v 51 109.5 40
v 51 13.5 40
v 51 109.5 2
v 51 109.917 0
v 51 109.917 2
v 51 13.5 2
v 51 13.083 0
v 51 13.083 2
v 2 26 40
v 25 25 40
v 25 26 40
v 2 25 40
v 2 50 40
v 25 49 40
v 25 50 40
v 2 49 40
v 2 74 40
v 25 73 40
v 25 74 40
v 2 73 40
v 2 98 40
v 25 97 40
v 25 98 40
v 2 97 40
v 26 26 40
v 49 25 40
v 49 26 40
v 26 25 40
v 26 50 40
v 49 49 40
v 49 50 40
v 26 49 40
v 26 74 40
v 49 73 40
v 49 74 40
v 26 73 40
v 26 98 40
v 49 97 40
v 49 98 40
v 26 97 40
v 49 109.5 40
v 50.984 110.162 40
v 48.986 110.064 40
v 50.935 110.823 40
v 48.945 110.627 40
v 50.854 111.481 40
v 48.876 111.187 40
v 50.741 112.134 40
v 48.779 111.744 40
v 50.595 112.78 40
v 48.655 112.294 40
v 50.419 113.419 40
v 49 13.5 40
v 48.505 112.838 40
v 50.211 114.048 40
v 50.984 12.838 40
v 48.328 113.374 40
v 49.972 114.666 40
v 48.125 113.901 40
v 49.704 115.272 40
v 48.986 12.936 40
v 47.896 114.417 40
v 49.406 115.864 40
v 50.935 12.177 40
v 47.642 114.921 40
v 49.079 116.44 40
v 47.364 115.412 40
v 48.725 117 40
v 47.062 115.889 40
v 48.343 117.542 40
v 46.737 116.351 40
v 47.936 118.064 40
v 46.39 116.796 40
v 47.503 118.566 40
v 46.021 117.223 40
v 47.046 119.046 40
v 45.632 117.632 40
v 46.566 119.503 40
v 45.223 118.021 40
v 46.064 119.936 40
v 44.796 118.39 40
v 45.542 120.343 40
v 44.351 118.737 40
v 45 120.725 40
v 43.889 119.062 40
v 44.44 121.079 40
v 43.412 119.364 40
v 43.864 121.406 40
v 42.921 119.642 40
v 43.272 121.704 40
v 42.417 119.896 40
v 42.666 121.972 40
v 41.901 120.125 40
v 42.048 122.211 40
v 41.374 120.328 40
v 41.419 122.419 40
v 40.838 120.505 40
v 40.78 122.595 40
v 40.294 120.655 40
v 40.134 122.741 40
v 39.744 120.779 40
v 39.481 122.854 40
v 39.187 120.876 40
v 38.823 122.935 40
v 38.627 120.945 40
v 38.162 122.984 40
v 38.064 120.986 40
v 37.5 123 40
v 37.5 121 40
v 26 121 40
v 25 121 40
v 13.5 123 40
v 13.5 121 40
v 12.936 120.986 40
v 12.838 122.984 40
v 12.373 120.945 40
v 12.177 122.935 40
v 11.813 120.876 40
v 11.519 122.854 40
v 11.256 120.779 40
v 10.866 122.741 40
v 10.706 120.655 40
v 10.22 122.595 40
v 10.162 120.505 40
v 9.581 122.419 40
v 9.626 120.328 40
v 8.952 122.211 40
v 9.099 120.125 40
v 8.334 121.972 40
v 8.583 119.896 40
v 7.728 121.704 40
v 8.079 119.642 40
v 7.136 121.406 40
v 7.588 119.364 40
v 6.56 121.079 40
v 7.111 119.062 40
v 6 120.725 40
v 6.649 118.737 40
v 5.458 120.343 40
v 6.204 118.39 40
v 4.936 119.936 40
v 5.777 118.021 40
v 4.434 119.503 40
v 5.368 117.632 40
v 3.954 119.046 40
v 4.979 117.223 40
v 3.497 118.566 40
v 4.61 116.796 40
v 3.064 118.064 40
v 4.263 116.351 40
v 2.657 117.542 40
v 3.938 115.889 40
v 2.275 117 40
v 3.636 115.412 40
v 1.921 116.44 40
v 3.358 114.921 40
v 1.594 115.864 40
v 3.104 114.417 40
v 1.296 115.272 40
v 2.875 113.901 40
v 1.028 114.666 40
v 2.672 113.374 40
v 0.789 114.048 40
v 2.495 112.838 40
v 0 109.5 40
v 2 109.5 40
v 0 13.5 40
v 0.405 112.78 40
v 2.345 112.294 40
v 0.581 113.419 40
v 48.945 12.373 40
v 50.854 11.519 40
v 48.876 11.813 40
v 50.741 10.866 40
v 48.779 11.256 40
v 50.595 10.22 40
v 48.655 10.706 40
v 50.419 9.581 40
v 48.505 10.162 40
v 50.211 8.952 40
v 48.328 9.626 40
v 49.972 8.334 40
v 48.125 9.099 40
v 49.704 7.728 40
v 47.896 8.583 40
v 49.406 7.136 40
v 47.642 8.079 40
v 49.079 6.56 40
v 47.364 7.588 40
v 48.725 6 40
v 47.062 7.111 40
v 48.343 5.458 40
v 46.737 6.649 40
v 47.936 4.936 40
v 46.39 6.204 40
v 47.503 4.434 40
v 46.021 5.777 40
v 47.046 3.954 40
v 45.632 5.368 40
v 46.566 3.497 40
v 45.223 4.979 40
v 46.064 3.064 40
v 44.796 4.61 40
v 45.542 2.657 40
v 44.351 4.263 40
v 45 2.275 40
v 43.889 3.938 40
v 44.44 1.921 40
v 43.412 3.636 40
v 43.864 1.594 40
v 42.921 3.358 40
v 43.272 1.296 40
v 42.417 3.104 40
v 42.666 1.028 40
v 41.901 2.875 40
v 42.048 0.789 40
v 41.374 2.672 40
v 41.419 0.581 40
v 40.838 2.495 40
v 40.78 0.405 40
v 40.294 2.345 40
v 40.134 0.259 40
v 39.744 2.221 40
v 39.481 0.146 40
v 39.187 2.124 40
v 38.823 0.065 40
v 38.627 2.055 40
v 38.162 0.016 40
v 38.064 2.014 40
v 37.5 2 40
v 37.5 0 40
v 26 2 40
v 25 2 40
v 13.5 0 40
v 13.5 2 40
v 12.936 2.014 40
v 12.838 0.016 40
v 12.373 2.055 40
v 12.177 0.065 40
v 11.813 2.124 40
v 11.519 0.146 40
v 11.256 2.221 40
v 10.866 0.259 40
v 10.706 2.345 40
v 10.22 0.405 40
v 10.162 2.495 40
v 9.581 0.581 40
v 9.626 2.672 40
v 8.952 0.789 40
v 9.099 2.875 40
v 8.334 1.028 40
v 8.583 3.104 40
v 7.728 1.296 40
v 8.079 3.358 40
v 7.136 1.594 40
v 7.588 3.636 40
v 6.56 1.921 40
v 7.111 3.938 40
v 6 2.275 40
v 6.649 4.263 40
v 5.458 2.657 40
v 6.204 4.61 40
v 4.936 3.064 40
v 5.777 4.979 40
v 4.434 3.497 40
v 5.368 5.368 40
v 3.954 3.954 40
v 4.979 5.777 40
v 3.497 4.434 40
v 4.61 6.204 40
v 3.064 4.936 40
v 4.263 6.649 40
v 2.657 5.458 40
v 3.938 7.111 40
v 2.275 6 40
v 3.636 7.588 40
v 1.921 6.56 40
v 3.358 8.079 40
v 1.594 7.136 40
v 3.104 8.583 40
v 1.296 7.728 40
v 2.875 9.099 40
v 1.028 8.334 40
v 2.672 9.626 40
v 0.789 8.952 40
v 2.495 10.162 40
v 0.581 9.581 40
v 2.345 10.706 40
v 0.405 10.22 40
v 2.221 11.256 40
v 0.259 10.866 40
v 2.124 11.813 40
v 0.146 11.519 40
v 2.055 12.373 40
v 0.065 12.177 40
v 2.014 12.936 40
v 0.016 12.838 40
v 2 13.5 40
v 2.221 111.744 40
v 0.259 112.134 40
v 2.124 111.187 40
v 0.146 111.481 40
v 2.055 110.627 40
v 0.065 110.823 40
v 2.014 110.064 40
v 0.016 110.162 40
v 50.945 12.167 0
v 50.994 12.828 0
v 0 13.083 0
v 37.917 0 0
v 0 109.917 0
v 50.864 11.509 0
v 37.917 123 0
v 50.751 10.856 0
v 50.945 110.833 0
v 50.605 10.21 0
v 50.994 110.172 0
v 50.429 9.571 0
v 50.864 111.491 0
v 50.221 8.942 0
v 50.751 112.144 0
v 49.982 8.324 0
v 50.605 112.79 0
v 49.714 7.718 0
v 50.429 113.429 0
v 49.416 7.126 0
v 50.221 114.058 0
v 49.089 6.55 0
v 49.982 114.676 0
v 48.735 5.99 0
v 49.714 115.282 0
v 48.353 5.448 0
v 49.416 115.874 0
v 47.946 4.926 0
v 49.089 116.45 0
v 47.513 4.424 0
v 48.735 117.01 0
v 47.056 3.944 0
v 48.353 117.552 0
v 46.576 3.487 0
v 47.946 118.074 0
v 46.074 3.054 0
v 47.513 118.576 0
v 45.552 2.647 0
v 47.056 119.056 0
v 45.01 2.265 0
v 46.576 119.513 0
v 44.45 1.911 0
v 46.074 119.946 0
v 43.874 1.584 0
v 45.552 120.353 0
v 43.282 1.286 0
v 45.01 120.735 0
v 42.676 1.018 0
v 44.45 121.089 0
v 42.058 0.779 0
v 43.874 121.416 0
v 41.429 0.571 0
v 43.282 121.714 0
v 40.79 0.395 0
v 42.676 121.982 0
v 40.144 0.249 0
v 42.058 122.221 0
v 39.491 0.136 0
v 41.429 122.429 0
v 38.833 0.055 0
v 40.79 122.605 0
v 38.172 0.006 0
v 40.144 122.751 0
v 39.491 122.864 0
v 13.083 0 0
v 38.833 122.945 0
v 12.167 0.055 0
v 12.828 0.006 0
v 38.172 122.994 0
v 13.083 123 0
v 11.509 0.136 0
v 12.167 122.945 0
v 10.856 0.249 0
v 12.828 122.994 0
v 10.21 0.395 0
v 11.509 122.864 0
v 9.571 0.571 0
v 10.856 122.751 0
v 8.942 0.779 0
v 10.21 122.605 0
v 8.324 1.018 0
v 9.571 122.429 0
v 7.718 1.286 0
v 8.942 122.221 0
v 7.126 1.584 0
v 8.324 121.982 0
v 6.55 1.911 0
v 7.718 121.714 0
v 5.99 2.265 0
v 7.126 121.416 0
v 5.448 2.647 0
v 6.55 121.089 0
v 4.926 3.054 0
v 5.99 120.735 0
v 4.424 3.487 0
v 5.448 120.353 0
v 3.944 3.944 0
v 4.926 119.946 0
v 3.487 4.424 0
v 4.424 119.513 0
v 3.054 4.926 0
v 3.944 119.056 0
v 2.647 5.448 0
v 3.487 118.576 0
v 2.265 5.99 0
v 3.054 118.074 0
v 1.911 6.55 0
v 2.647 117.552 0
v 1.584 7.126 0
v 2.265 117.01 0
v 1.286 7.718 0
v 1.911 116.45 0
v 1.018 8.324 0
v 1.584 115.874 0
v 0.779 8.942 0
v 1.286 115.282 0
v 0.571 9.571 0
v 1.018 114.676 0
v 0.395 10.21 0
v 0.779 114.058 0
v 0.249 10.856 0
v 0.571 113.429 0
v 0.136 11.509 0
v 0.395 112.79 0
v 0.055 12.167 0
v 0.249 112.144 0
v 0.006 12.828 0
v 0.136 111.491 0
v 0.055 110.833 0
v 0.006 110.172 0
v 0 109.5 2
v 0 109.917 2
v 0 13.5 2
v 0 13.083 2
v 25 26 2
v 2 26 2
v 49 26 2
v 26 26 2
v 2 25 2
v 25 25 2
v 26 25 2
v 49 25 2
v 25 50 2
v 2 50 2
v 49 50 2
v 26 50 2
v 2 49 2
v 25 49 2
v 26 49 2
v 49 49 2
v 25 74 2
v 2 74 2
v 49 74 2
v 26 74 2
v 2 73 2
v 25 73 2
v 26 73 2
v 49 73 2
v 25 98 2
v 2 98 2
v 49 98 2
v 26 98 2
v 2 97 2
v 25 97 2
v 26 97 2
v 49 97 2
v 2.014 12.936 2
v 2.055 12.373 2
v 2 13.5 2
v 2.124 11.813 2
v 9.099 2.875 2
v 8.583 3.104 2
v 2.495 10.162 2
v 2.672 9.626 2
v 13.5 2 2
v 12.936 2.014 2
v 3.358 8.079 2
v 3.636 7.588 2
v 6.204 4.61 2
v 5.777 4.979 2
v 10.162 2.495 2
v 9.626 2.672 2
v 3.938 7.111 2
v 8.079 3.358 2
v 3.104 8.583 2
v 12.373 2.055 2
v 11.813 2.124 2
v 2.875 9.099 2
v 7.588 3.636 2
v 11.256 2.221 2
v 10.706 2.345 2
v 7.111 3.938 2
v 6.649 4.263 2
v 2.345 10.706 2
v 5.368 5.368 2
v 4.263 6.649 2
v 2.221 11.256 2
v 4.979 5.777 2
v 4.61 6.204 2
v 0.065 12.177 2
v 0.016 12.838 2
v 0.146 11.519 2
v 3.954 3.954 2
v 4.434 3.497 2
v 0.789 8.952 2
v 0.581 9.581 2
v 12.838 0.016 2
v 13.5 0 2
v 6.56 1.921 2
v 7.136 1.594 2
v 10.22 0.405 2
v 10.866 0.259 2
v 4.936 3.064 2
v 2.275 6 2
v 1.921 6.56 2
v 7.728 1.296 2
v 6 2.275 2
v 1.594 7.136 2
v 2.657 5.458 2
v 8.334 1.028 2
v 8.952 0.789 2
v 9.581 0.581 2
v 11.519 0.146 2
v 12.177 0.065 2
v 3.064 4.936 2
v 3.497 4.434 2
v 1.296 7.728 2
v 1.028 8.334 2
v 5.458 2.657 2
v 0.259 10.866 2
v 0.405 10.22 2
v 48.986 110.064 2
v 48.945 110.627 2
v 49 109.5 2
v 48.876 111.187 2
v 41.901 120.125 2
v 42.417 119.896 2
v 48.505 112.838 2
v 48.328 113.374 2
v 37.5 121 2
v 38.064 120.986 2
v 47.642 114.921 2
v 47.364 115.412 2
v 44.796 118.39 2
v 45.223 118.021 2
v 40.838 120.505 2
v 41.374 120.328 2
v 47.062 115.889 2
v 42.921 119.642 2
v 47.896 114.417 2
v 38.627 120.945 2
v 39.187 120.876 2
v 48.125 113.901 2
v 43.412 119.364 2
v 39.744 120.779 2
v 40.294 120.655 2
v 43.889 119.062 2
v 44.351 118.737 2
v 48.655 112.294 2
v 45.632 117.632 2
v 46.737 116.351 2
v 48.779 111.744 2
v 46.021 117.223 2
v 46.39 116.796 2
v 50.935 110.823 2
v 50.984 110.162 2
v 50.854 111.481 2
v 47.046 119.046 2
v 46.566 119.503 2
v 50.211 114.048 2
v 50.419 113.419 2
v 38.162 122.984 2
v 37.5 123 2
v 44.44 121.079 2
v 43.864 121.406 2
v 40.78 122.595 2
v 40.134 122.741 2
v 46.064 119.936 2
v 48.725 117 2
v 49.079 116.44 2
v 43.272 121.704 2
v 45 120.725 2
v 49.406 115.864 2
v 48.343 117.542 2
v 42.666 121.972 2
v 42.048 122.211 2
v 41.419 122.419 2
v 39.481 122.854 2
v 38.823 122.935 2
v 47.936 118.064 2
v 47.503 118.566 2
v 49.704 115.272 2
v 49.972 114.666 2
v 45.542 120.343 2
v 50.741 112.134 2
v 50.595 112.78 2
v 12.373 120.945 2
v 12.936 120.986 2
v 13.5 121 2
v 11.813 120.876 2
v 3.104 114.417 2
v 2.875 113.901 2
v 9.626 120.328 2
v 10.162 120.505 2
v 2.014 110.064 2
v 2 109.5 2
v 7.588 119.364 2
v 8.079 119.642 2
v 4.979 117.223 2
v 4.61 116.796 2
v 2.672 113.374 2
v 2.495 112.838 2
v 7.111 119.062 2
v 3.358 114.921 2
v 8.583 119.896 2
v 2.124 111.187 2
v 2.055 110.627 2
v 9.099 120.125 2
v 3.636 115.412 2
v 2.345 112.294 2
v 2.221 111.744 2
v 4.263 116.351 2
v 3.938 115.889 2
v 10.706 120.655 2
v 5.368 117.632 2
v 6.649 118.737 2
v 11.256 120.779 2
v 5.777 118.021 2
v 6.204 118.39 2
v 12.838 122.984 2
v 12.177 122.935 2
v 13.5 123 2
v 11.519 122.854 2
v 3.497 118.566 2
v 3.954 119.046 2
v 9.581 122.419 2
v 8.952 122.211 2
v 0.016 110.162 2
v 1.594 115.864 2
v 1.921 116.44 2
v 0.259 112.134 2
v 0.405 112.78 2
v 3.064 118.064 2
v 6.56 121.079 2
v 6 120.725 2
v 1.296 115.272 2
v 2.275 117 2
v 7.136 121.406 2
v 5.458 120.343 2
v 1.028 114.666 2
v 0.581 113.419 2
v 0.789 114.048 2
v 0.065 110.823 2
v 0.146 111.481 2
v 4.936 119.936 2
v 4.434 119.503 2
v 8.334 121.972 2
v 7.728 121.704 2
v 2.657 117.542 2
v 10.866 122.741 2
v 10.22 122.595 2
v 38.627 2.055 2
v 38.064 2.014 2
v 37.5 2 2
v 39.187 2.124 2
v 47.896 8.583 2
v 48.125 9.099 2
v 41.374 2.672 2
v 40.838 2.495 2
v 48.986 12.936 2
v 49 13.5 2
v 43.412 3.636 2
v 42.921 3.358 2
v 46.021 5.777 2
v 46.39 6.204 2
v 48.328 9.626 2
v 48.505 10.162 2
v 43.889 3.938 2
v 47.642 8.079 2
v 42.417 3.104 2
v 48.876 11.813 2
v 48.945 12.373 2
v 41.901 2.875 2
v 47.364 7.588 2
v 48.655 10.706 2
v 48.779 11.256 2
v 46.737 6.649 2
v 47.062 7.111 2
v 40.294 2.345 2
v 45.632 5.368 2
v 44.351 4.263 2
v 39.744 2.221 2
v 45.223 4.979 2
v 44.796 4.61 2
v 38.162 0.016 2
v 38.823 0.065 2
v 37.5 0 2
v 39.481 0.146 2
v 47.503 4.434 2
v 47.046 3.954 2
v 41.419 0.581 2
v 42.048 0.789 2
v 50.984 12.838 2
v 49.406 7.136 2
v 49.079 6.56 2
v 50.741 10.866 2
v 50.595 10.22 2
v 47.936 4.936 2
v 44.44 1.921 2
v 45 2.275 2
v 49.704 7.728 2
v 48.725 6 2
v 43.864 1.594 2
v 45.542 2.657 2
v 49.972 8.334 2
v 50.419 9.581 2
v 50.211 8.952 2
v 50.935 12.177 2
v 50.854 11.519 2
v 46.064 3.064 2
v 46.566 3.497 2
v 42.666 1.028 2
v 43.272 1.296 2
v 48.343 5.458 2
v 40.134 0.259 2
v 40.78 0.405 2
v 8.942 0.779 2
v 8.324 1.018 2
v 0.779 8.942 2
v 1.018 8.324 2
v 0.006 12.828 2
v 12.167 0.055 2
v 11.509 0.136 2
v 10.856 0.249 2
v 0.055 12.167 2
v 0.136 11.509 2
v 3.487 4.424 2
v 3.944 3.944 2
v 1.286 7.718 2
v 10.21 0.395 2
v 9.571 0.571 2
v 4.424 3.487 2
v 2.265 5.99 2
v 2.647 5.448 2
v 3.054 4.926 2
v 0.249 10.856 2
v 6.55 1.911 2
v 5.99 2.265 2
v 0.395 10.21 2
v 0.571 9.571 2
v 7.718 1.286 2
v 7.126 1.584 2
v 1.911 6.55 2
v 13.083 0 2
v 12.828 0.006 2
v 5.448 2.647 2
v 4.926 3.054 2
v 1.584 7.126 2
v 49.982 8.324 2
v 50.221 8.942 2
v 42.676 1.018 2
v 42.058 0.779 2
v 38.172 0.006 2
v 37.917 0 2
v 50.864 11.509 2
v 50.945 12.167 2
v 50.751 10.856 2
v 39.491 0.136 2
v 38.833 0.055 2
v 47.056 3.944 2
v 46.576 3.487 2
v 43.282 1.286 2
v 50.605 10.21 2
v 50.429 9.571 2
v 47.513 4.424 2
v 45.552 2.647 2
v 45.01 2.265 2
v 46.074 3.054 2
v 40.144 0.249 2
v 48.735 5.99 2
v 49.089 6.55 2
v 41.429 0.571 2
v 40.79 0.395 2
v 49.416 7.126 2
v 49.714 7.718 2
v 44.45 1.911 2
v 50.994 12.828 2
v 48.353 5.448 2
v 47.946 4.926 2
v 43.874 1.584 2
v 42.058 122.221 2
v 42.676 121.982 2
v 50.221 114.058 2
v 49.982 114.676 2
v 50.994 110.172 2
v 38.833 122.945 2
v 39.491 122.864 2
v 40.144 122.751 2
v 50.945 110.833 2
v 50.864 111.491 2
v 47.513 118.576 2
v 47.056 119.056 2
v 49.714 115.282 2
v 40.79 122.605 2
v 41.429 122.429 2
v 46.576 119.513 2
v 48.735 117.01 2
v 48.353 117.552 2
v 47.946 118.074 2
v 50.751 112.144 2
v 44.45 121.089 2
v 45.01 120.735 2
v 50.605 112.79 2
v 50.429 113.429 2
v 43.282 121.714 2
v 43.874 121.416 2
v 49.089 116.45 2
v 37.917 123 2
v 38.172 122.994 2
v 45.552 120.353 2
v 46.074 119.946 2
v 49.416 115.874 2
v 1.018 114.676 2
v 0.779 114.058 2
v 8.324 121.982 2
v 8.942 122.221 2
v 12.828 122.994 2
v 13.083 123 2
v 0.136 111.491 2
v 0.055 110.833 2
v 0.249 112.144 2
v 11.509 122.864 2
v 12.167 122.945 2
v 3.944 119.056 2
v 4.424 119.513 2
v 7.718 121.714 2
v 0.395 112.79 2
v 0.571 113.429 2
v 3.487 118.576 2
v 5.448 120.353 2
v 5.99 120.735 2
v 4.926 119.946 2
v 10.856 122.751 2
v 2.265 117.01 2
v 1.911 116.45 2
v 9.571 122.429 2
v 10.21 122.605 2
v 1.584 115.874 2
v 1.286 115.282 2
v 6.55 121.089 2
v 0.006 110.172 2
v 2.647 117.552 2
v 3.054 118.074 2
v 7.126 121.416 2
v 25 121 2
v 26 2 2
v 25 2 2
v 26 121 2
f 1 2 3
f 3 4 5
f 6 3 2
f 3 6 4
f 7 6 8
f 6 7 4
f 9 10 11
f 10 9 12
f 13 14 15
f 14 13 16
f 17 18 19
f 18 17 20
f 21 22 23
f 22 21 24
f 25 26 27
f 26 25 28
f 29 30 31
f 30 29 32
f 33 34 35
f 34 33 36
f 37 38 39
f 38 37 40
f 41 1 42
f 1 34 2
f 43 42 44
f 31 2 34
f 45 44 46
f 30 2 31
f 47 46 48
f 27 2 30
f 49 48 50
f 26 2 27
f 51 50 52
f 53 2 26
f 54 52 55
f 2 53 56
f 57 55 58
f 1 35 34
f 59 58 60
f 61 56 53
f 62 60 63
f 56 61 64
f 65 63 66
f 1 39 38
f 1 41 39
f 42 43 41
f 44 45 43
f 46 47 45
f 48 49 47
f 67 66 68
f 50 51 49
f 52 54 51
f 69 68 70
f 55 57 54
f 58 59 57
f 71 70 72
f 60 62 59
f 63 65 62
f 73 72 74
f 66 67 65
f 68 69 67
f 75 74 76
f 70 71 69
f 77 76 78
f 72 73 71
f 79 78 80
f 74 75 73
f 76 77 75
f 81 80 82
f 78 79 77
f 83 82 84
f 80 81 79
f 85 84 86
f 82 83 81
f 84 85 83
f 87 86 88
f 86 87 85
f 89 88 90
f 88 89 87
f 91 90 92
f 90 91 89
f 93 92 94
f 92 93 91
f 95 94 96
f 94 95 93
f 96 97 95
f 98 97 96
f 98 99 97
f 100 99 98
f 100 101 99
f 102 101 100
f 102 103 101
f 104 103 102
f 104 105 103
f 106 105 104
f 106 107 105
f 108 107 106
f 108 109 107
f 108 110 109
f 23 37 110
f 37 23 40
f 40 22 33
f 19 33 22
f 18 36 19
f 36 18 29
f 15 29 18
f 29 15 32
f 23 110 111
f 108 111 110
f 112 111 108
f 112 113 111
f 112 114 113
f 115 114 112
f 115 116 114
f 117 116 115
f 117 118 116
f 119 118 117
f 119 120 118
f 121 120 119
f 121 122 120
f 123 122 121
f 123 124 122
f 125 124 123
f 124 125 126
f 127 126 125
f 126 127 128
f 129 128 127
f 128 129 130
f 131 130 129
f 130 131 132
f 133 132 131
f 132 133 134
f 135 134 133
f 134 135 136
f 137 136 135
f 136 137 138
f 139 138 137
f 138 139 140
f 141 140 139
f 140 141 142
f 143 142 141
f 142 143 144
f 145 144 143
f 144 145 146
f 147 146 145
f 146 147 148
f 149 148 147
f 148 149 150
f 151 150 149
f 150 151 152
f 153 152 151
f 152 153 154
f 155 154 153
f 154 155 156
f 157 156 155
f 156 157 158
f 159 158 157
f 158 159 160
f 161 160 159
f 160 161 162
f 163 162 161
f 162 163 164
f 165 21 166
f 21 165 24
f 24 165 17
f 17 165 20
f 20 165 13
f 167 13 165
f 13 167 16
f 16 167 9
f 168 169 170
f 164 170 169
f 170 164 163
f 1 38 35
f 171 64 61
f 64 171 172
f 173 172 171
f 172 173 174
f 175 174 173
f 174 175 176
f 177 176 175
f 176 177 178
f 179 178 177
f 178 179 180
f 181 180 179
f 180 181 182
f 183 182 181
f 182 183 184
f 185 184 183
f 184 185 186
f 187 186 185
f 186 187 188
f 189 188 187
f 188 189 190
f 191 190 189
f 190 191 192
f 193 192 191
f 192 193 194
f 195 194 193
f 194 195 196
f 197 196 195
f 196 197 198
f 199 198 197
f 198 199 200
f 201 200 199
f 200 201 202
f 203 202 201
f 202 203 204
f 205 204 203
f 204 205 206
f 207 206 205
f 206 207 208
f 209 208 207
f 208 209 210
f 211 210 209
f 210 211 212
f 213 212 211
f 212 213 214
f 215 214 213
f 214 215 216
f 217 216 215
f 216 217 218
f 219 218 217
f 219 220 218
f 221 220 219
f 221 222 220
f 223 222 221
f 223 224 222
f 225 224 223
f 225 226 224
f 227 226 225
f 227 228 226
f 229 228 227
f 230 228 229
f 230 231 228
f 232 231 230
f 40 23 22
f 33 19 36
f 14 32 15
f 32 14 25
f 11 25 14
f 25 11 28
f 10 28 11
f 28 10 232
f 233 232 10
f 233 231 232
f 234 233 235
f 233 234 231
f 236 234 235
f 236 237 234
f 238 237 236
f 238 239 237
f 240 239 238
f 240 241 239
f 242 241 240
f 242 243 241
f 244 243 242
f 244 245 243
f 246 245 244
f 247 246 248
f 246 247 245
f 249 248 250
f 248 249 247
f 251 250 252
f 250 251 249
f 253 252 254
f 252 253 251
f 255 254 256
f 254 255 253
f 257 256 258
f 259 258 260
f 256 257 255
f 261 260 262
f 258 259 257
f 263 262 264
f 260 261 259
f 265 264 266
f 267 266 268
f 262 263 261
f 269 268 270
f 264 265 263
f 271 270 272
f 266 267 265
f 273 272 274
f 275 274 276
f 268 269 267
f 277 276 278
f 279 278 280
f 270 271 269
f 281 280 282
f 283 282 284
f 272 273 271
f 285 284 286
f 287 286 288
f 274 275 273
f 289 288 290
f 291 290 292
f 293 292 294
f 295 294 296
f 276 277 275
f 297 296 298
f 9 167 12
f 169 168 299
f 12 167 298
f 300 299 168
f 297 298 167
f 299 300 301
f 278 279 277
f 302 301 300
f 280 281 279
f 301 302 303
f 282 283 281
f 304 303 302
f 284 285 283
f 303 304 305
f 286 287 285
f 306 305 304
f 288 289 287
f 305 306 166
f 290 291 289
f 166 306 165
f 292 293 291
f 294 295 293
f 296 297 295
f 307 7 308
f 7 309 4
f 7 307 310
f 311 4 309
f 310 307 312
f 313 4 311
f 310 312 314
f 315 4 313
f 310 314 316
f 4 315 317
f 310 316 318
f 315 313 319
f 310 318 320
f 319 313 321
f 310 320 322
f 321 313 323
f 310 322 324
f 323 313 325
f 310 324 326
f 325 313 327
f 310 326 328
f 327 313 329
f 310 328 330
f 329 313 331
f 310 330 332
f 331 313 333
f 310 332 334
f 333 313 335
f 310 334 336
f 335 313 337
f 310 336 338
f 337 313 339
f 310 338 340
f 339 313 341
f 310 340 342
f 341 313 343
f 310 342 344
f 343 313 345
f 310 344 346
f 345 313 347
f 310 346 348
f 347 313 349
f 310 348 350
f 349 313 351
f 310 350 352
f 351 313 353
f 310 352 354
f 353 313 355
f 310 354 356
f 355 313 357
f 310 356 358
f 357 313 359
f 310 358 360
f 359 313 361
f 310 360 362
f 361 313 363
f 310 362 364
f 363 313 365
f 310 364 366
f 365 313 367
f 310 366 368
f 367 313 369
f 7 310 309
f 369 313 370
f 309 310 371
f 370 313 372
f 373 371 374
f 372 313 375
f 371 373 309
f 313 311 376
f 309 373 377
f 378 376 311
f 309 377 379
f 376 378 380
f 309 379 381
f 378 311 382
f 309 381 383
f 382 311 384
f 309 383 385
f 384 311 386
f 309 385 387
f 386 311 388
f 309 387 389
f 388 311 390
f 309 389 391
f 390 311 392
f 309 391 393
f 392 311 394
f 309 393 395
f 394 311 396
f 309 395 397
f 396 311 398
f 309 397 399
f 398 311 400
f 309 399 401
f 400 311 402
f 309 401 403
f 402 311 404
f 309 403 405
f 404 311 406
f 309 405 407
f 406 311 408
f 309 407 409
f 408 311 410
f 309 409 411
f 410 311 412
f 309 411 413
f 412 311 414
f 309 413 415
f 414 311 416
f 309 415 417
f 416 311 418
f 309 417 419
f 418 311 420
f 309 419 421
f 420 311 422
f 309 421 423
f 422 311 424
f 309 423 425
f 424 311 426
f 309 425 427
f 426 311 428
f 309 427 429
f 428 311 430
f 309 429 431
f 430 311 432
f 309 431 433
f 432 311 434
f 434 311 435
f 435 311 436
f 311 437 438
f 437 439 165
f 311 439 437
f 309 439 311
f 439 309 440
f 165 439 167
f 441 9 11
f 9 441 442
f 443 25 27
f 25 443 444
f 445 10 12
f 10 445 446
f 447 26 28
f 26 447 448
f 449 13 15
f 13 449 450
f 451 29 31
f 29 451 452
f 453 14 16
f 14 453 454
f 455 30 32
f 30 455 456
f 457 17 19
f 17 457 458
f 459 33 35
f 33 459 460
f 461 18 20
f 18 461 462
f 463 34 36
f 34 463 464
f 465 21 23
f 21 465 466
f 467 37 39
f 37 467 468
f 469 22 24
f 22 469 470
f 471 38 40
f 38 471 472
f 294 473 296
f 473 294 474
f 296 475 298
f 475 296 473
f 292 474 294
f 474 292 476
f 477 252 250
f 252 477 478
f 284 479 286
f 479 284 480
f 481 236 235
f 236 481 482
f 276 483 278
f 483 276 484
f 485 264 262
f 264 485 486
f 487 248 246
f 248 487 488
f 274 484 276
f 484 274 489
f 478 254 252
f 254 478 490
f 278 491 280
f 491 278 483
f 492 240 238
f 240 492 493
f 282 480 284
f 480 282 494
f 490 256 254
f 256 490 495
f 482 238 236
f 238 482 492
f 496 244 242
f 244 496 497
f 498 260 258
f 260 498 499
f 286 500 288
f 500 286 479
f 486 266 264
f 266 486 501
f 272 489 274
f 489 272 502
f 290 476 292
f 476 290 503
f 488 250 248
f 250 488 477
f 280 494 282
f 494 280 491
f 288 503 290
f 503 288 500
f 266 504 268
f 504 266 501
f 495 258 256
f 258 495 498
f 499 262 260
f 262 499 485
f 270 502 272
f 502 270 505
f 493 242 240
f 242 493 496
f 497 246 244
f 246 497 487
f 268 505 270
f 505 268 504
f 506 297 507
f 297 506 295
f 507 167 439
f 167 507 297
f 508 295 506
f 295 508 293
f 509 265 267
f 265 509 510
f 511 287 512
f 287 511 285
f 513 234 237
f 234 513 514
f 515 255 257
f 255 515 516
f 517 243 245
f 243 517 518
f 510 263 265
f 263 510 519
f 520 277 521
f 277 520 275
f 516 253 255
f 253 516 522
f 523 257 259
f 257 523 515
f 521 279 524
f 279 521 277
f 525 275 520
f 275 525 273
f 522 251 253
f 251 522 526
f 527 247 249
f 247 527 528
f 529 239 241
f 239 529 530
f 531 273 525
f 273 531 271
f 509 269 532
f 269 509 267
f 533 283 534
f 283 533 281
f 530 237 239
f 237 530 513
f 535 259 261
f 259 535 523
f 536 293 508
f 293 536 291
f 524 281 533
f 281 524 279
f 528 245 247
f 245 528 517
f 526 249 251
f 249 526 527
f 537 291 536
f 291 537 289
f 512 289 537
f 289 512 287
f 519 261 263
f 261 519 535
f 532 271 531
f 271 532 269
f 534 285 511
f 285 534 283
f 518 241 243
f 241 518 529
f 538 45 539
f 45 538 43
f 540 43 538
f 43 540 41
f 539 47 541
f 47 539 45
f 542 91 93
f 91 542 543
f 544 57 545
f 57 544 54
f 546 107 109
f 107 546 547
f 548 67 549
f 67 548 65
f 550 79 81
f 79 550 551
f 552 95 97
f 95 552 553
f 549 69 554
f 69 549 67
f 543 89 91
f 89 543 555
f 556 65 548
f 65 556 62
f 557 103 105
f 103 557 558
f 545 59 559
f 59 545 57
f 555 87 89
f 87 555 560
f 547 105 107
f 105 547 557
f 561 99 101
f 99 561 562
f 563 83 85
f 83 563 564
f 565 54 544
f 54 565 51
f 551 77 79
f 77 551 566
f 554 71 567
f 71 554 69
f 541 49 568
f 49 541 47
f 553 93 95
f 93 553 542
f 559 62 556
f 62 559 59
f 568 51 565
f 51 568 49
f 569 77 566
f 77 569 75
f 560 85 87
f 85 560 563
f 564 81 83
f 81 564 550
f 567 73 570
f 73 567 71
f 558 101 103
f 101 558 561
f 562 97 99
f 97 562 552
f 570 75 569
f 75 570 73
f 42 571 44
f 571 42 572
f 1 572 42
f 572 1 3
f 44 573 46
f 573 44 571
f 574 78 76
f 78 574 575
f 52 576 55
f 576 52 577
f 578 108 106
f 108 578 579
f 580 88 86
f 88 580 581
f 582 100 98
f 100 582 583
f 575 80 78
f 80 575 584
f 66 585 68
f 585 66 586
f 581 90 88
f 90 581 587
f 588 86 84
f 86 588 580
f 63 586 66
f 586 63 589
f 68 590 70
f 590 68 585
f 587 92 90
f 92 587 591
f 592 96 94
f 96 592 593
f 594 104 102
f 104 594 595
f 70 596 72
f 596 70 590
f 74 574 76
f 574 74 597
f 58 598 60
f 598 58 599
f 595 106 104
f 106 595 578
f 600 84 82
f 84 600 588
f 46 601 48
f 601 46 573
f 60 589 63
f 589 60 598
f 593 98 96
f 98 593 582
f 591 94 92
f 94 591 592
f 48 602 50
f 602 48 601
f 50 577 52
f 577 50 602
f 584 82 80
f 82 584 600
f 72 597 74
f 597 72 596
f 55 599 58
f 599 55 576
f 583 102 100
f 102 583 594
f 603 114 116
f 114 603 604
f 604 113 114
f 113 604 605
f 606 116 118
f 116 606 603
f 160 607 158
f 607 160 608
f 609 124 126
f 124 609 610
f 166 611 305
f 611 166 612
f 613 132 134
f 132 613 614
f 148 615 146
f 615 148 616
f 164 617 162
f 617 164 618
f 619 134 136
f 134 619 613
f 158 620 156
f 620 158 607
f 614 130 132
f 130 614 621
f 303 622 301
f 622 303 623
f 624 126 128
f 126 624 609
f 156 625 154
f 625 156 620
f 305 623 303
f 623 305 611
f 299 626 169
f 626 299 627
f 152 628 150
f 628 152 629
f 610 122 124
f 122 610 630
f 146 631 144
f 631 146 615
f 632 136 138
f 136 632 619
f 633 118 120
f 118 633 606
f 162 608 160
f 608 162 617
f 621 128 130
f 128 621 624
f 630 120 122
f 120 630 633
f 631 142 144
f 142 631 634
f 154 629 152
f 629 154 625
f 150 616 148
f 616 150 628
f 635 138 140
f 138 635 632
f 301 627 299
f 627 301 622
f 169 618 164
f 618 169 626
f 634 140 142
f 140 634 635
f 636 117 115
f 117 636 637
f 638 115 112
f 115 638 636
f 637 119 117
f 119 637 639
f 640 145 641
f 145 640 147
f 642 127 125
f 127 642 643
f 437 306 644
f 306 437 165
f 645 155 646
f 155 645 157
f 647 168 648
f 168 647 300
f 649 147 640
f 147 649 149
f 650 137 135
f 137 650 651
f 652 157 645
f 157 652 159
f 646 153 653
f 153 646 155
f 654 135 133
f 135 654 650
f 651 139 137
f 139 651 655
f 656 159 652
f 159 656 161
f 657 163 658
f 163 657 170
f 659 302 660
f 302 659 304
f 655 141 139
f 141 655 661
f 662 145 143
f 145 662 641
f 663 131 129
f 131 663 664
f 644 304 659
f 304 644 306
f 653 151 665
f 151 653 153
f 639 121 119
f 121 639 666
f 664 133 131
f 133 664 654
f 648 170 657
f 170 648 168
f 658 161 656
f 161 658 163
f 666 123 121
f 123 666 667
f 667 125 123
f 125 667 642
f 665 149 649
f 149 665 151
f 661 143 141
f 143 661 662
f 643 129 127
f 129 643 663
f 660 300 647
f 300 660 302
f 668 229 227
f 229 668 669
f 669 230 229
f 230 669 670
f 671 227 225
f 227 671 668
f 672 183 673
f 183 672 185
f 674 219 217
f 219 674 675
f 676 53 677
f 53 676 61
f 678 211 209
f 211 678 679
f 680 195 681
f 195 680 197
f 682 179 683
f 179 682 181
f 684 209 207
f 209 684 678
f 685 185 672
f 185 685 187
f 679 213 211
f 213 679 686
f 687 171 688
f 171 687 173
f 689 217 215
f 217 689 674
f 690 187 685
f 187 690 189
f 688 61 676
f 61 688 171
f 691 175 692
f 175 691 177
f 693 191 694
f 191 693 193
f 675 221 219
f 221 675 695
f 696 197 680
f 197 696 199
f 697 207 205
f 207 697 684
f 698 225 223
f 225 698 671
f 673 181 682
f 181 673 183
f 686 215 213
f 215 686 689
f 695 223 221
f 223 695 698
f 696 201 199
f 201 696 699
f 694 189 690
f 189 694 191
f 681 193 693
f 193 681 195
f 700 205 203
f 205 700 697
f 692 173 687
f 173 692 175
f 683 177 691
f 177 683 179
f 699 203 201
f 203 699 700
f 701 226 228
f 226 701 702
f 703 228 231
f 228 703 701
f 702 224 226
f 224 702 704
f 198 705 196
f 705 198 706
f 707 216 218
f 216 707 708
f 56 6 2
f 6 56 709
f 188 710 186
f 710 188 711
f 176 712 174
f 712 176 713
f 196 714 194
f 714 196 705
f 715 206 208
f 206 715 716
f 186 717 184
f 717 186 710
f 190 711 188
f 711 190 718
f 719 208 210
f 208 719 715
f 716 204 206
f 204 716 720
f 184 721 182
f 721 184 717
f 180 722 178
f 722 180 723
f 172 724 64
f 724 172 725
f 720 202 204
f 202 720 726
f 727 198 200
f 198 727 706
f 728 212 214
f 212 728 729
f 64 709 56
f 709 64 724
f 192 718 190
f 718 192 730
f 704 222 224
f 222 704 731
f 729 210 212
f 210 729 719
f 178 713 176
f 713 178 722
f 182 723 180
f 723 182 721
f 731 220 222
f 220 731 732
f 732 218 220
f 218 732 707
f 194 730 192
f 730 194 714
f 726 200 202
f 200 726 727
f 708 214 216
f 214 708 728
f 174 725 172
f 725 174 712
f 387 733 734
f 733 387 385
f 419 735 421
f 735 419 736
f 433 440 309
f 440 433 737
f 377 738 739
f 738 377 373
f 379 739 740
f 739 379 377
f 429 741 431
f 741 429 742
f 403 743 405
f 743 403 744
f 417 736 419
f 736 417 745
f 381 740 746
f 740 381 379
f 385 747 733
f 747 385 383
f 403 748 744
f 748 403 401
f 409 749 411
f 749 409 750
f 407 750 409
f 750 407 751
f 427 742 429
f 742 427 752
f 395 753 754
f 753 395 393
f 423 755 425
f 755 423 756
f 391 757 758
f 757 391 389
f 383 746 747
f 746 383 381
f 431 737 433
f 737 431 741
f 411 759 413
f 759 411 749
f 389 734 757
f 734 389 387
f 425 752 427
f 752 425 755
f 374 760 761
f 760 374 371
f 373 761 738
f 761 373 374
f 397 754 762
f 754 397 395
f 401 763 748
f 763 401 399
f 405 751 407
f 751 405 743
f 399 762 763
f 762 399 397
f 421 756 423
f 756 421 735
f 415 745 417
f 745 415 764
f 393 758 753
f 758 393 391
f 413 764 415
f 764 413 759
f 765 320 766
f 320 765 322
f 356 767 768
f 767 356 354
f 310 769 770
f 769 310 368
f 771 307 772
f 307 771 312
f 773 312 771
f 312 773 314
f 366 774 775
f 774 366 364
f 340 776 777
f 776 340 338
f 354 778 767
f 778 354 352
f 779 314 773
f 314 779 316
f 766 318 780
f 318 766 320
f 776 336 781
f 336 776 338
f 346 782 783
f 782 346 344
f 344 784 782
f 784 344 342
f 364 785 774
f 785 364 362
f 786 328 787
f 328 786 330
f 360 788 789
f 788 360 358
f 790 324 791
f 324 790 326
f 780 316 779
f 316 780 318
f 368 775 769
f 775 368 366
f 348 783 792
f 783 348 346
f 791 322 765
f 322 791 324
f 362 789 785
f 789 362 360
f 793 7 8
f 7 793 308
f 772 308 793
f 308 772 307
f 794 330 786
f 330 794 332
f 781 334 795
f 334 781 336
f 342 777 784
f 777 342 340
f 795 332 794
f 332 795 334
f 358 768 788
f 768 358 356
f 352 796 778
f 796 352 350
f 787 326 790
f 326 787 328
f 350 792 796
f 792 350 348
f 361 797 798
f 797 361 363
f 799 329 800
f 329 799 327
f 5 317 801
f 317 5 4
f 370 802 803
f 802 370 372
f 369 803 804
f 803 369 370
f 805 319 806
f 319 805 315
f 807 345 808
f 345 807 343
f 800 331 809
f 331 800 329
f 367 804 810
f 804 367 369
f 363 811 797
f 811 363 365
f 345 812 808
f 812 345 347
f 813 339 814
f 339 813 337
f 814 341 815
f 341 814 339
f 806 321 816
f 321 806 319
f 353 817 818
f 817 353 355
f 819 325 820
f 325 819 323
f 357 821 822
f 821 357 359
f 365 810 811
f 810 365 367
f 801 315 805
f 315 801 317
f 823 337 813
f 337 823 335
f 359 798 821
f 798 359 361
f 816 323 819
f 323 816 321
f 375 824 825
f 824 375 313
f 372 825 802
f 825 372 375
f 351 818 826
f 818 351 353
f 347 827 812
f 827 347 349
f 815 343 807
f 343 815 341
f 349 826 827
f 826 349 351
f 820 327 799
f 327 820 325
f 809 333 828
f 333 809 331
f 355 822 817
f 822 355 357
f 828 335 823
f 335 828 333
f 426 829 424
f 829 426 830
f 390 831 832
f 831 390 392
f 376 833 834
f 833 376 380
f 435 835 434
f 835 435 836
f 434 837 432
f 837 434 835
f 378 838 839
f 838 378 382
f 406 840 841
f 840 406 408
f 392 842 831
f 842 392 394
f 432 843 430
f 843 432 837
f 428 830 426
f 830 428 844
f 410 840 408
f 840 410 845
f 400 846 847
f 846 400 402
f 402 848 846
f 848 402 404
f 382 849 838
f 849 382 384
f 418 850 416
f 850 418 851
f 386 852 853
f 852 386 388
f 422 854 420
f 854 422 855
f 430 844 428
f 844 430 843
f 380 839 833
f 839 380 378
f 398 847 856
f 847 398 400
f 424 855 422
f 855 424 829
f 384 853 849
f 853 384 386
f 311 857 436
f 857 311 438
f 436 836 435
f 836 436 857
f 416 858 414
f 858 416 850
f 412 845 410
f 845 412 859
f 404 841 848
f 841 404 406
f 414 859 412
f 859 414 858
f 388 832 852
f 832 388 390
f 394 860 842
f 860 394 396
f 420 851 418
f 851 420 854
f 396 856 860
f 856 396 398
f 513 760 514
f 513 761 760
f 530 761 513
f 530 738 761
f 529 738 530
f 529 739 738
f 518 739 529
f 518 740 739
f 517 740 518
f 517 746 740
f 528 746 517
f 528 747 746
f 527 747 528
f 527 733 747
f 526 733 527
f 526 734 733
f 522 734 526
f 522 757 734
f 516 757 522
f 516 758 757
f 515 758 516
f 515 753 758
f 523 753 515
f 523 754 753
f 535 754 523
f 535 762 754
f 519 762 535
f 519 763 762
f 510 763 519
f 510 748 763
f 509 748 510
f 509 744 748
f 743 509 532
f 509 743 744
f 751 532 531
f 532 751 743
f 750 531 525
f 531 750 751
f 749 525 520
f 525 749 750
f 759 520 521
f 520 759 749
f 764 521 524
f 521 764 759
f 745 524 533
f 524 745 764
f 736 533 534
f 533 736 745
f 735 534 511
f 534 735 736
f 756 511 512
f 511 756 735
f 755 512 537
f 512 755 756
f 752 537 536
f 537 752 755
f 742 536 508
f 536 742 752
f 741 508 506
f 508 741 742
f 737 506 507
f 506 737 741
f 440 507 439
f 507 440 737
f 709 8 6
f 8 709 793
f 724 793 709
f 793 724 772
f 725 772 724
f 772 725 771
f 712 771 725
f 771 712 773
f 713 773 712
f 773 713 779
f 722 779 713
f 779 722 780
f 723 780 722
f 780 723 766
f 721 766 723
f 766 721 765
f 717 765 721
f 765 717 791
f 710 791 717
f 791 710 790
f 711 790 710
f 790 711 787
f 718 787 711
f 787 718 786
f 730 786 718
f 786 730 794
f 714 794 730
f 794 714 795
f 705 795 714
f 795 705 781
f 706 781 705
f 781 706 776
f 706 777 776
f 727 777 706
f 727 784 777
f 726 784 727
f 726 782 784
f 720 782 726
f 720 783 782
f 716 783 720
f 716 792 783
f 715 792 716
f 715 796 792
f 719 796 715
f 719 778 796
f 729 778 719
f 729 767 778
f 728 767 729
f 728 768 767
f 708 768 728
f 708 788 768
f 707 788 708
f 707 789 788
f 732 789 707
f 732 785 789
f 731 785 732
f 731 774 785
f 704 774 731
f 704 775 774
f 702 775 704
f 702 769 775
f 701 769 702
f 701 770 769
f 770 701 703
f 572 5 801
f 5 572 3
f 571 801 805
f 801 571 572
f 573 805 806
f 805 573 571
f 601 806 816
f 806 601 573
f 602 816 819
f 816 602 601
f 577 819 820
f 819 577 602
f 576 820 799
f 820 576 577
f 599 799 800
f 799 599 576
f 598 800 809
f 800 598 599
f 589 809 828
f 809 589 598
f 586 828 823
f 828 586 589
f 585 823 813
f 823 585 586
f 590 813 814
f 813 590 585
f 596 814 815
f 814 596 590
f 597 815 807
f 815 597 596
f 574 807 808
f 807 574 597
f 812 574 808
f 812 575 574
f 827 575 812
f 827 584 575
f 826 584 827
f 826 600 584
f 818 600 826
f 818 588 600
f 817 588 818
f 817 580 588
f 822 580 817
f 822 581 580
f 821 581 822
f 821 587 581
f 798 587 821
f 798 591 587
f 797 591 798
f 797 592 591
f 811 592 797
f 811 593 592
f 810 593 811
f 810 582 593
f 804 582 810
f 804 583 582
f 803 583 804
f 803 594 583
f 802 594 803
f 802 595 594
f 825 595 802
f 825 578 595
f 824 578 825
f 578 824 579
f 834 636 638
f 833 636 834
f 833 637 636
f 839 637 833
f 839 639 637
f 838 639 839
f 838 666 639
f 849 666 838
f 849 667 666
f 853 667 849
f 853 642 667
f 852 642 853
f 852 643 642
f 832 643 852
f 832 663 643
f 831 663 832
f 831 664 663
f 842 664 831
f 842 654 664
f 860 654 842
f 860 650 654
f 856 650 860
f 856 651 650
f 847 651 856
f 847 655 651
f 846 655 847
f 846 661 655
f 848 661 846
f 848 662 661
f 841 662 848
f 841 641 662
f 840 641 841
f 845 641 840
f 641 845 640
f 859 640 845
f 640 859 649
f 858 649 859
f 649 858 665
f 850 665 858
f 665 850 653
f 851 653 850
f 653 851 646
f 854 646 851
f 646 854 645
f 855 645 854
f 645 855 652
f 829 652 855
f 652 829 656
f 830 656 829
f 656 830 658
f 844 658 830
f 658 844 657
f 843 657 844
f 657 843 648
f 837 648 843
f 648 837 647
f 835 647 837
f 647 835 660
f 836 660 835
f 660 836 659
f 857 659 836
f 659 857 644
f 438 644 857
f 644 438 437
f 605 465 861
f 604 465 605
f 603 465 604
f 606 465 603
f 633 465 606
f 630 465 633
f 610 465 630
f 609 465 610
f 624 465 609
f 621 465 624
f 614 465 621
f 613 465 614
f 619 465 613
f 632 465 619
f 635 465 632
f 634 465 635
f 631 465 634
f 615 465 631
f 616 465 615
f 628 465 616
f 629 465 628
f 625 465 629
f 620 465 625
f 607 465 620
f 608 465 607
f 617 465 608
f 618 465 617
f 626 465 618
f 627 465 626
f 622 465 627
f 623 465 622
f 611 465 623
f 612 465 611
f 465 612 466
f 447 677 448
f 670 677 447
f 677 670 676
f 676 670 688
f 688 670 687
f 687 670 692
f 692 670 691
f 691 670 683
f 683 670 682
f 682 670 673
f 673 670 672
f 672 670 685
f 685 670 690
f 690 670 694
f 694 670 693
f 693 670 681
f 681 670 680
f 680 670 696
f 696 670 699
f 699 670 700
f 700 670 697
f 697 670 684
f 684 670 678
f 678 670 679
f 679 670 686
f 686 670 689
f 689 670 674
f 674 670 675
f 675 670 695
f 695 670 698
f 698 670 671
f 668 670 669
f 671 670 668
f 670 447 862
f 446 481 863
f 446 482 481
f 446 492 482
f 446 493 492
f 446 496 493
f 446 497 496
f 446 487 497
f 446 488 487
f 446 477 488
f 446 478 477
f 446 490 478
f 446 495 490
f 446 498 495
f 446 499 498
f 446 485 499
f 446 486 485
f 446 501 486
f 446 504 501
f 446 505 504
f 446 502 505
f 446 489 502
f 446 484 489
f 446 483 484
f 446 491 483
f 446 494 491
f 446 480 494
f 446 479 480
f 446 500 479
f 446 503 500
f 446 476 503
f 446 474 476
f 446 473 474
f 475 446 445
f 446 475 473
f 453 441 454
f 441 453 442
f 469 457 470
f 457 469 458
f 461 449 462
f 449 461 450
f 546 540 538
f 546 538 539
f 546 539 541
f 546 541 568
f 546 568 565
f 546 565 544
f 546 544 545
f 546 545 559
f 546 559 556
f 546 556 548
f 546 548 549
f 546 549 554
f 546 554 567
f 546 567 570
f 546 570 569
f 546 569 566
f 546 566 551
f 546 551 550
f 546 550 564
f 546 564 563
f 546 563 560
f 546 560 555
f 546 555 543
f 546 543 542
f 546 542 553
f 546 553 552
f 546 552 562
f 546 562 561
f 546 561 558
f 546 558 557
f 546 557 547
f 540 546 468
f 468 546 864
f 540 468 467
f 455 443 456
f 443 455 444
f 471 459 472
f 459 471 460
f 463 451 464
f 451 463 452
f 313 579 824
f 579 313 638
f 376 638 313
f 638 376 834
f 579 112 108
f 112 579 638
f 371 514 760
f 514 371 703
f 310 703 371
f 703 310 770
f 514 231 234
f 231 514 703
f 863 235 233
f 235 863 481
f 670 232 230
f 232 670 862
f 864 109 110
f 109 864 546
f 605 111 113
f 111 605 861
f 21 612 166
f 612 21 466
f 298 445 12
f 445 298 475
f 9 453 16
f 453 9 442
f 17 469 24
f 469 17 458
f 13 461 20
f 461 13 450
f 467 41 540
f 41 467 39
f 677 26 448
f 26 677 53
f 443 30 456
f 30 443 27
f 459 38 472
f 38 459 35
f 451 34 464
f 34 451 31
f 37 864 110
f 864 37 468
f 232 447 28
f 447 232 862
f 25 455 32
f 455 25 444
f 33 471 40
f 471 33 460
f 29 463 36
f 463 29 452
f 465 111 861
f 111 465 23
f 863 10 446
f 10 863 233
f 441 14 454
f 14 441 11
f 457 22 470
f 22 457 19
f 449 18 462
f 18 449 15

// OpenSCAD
// container for lipstick in a mirror cabinet
// holds lipsticks with magnetic lids in place


$fn= $preview ? 32 : 128;

/*
// Parameters for thick lipstick
numRows = 4;          // Number of rows of lipstick holes
numCols = 2;          // Number of columns of lipstick holes
boxHeight = 30;       // Height of the box
holeDiameter = 28;    // Diameter of each lipstick hole
outerWall = 1.5;      // outer wall thickness
innerWall = 1.0;      // inner wall thickness
*/
//*
// Parameters for thin lipstick
numRows = 5;          // Number of rows of lipstick holes
numCols = 2;          // Number of columns of lipstick holes
boxHeight = 40;       // Height of the box
holeDiameter = 23;    // Diameter of each lipstick hole
outerWall = 2;        // outer wall thickness
innerWall = 1;        // inner wall thickness
//*/


// precomputed often used values
width = numCols * holeDiameter + (numCols - 1) * innerWall + 2*outerWall;
depth = numRows * holeDiameter + (numRows - 1) * innerWall + 2*outerWall;
widthStraightPart = width - holeDiameter - 2*outerWall; 
depthStraightPart = depth - holeDiameter - 2*outerWall; 

roundedEdgeWidth = holeDiameter/2 + outerWall;

module roundedEdge() {
    difference() {
        cylinder(h = boxHeight, r = roundedEdgeWidth, center = false);
        translate([0, 0, -1]) {
            cylinder(h = boxHeight + 2, r = holeDiameter/2, center = false);
            translate([-roundedEdgeWidth - 1, -roundedEdgeWidth - 1, 0]) {
                cube([roundedEdgeWidth + 1, 2*roundedEdgeWidth + 2, boxHeight + 2], center = false);
                cube([2*roundedEdgeWidth + 2, roundedEdgeWidth + 1, boxHeight + 2], center = false);
            }       
        }
    }
}

module roundedEdgeCutoff() {
    difference() {
        translate([0, 0, -1])
            cube([roundedEdgeWidth, roundedEdgeWidth, boxHeight+2], center = false);
        translate([roundedEdgeWidth, roundedEdgeWidth, -2])
            cylinder(h = boxHeight + 4, r = holeDiameter/2 + outerWall, center = false);       
    }
}

union() {
    // outer walls
    translate([outerWall + holeDiameter/2, 0, 0])
        cube([widthStraightPart, outerWall, boxHeight], false);
    translate([outerWall + holeDiameter/2, depth-outerWall, 0])
        cube([widthStraightPart, outerWall, boxHeight], false);
    translate([0, outerWall + holeDiameter/2, 0])
        cube([outerWall, depthStraightPart, boxHeight], false);
    translate([width-outerWall, outerWall + holeDiameter/2, 0])
        cube([outerWall, depthStraightPart, boxHeight], false);
    
    // inner walls
    for (c = [1:numCols - 1]) {
        translate([outerWall + holeDiameter*c + innerWall*(c-1), 0, 0])
            cube([innerWall, depth, boxHeight]);
    }
    for (r = [1:numRows - 1]) {
        translate([0, outerWall + holeDiameter*r + innerWall*(r-1), 0])
            cube([width, innerWall, boxHeight]);
    }

    // rounded edges
    translate([roundedEdgeWidth, roundedEdgeWidth, 0]) rotate([0, 0, 180]) roundedEdge();
    translate([width-roundedEdgeWidth, depth-roundedEdgeWidth, 0]) rotate([0, 0, 0]) roundedEdge();
    translate([roundedEdgeWidth, depth-roundedEdgeWidth, 0]) rotate([0, 0, 90]) roundedEdge();
    translate([width-roundedEdgeWidth, roundedEdgeWidth, 0]) rotate([0, 0, 270]) roundedEdge();

    // bottom
    difference() {
        cube([width, depth, outerWall]);
        translate([-0.01, -0.01, 0]) roundedEdgeCutoff();
        translate([width+0.01, -0.01, 0])      rotate([0, 0, 90])  roundedEdgeCutoff();
        translate([width+0.01, depth+0.01, 0]) rotate([0, 0, 180]) roundedEdgeCutoff();
        translate([-0.01, depth+0.01, 0])      rotate([0, 0, 270]) roundedEdgeCutoff();
    }
}
